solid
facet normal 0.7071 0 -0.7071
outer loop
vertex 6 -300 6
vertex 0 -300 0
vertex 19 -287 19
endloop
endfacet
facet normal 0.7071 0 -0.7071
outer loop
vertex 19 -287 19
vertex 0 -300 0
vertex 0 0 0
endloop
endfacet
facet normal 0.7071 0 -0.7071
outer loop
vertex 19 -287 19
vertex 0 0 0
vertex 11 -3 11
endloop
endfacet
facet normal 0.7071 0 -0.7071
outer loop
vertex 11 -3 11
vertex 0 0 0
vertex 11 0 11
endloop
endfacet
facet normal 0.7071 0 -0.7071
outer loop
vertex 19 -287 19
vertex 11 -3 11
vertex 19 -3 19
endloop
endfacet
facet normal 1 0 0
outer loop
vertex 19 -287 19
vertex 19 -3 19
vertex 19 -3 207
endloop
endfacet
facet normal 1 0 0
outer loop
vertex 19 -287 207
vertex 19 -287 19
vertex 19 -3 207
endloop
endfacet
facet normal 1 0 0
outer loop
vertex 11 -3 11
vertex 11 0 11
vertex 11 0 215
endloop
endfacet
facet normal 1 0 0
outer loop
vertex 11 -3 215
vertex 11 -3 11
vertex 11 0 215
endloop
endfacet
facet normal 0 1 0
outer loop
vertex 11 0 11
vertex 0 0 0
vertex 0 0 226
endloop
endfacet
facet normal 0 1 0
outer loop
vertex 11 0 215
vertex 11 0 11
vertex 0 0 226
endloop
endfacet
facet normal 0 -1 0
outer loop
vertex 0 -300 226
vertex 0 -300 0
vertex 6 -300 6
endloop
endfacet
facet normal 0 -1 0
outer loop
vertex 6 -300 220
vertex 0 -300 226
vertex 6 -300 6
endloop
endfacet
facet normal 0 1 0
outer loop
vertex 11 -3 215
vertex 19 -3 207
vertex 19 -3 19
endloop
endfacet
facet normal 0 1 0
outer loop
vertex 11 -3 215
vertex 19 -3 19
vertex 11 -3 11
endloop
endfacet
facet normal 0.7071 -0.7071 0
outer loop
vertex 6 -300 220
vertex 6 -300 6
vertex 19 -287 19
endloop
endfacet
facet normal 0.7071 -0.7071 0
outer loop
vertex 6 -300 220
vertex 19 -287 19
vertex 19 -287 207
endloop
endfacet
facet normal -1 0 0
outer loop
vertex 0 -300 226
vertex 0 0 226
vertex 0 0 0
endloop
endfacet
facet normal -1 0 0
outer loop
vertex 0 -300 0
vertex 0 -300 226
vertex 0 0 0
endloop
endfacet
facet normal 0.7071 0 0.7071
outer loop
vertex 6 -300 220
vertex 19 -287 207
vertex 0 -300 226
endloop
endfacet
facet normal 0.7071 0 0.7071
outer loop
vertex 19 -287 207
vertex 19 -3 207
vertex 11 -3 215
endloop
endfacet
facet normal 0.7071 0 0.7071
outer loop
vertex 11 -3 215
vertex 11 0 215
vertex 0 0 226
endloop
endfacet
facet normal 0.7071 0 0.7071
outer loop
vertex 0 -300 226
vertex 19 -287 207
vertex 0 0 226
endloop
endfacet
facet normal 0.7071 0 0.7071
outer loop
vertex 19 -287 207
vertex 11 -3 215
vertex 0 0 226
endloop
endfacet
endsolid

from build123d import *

# Parameters (mm, degrees)
F1_DEPTH = 300
F2_SIZE  = 13
F3_W     = 8
F3_H     = 300
F4_DEPTH = 3


with BuildPart() as f1:
    # F0 (on Front) → F1 (new body)
    with BuildSketch(Plane.XZ):
        Polygon((0, 226), (0, 0), (19, 19), (19, 207), align=None)
    extrude(amount=F1_DEPTH)

    # F2
    f2_edges = [f1.edges().sort_by_distance(p)[0] for p in [
        (19, -300, 113),
    ]]
    chamfer(f2_edges, length=F2_SIZE)

    # F3 (on face) → F4 (cut)
    with BuildSketch(Plane(origin=(0, 0, 0), x_dir=(-1, 0, 0), z_dir=(0, 1, 0))):
        with Locations((-15, 150)):
            Rectangle(F3_W, F3_H)
    extrude(amount=-F4_DEPTH, mode=Mode.SUBTRACT)


solid = f1.part
